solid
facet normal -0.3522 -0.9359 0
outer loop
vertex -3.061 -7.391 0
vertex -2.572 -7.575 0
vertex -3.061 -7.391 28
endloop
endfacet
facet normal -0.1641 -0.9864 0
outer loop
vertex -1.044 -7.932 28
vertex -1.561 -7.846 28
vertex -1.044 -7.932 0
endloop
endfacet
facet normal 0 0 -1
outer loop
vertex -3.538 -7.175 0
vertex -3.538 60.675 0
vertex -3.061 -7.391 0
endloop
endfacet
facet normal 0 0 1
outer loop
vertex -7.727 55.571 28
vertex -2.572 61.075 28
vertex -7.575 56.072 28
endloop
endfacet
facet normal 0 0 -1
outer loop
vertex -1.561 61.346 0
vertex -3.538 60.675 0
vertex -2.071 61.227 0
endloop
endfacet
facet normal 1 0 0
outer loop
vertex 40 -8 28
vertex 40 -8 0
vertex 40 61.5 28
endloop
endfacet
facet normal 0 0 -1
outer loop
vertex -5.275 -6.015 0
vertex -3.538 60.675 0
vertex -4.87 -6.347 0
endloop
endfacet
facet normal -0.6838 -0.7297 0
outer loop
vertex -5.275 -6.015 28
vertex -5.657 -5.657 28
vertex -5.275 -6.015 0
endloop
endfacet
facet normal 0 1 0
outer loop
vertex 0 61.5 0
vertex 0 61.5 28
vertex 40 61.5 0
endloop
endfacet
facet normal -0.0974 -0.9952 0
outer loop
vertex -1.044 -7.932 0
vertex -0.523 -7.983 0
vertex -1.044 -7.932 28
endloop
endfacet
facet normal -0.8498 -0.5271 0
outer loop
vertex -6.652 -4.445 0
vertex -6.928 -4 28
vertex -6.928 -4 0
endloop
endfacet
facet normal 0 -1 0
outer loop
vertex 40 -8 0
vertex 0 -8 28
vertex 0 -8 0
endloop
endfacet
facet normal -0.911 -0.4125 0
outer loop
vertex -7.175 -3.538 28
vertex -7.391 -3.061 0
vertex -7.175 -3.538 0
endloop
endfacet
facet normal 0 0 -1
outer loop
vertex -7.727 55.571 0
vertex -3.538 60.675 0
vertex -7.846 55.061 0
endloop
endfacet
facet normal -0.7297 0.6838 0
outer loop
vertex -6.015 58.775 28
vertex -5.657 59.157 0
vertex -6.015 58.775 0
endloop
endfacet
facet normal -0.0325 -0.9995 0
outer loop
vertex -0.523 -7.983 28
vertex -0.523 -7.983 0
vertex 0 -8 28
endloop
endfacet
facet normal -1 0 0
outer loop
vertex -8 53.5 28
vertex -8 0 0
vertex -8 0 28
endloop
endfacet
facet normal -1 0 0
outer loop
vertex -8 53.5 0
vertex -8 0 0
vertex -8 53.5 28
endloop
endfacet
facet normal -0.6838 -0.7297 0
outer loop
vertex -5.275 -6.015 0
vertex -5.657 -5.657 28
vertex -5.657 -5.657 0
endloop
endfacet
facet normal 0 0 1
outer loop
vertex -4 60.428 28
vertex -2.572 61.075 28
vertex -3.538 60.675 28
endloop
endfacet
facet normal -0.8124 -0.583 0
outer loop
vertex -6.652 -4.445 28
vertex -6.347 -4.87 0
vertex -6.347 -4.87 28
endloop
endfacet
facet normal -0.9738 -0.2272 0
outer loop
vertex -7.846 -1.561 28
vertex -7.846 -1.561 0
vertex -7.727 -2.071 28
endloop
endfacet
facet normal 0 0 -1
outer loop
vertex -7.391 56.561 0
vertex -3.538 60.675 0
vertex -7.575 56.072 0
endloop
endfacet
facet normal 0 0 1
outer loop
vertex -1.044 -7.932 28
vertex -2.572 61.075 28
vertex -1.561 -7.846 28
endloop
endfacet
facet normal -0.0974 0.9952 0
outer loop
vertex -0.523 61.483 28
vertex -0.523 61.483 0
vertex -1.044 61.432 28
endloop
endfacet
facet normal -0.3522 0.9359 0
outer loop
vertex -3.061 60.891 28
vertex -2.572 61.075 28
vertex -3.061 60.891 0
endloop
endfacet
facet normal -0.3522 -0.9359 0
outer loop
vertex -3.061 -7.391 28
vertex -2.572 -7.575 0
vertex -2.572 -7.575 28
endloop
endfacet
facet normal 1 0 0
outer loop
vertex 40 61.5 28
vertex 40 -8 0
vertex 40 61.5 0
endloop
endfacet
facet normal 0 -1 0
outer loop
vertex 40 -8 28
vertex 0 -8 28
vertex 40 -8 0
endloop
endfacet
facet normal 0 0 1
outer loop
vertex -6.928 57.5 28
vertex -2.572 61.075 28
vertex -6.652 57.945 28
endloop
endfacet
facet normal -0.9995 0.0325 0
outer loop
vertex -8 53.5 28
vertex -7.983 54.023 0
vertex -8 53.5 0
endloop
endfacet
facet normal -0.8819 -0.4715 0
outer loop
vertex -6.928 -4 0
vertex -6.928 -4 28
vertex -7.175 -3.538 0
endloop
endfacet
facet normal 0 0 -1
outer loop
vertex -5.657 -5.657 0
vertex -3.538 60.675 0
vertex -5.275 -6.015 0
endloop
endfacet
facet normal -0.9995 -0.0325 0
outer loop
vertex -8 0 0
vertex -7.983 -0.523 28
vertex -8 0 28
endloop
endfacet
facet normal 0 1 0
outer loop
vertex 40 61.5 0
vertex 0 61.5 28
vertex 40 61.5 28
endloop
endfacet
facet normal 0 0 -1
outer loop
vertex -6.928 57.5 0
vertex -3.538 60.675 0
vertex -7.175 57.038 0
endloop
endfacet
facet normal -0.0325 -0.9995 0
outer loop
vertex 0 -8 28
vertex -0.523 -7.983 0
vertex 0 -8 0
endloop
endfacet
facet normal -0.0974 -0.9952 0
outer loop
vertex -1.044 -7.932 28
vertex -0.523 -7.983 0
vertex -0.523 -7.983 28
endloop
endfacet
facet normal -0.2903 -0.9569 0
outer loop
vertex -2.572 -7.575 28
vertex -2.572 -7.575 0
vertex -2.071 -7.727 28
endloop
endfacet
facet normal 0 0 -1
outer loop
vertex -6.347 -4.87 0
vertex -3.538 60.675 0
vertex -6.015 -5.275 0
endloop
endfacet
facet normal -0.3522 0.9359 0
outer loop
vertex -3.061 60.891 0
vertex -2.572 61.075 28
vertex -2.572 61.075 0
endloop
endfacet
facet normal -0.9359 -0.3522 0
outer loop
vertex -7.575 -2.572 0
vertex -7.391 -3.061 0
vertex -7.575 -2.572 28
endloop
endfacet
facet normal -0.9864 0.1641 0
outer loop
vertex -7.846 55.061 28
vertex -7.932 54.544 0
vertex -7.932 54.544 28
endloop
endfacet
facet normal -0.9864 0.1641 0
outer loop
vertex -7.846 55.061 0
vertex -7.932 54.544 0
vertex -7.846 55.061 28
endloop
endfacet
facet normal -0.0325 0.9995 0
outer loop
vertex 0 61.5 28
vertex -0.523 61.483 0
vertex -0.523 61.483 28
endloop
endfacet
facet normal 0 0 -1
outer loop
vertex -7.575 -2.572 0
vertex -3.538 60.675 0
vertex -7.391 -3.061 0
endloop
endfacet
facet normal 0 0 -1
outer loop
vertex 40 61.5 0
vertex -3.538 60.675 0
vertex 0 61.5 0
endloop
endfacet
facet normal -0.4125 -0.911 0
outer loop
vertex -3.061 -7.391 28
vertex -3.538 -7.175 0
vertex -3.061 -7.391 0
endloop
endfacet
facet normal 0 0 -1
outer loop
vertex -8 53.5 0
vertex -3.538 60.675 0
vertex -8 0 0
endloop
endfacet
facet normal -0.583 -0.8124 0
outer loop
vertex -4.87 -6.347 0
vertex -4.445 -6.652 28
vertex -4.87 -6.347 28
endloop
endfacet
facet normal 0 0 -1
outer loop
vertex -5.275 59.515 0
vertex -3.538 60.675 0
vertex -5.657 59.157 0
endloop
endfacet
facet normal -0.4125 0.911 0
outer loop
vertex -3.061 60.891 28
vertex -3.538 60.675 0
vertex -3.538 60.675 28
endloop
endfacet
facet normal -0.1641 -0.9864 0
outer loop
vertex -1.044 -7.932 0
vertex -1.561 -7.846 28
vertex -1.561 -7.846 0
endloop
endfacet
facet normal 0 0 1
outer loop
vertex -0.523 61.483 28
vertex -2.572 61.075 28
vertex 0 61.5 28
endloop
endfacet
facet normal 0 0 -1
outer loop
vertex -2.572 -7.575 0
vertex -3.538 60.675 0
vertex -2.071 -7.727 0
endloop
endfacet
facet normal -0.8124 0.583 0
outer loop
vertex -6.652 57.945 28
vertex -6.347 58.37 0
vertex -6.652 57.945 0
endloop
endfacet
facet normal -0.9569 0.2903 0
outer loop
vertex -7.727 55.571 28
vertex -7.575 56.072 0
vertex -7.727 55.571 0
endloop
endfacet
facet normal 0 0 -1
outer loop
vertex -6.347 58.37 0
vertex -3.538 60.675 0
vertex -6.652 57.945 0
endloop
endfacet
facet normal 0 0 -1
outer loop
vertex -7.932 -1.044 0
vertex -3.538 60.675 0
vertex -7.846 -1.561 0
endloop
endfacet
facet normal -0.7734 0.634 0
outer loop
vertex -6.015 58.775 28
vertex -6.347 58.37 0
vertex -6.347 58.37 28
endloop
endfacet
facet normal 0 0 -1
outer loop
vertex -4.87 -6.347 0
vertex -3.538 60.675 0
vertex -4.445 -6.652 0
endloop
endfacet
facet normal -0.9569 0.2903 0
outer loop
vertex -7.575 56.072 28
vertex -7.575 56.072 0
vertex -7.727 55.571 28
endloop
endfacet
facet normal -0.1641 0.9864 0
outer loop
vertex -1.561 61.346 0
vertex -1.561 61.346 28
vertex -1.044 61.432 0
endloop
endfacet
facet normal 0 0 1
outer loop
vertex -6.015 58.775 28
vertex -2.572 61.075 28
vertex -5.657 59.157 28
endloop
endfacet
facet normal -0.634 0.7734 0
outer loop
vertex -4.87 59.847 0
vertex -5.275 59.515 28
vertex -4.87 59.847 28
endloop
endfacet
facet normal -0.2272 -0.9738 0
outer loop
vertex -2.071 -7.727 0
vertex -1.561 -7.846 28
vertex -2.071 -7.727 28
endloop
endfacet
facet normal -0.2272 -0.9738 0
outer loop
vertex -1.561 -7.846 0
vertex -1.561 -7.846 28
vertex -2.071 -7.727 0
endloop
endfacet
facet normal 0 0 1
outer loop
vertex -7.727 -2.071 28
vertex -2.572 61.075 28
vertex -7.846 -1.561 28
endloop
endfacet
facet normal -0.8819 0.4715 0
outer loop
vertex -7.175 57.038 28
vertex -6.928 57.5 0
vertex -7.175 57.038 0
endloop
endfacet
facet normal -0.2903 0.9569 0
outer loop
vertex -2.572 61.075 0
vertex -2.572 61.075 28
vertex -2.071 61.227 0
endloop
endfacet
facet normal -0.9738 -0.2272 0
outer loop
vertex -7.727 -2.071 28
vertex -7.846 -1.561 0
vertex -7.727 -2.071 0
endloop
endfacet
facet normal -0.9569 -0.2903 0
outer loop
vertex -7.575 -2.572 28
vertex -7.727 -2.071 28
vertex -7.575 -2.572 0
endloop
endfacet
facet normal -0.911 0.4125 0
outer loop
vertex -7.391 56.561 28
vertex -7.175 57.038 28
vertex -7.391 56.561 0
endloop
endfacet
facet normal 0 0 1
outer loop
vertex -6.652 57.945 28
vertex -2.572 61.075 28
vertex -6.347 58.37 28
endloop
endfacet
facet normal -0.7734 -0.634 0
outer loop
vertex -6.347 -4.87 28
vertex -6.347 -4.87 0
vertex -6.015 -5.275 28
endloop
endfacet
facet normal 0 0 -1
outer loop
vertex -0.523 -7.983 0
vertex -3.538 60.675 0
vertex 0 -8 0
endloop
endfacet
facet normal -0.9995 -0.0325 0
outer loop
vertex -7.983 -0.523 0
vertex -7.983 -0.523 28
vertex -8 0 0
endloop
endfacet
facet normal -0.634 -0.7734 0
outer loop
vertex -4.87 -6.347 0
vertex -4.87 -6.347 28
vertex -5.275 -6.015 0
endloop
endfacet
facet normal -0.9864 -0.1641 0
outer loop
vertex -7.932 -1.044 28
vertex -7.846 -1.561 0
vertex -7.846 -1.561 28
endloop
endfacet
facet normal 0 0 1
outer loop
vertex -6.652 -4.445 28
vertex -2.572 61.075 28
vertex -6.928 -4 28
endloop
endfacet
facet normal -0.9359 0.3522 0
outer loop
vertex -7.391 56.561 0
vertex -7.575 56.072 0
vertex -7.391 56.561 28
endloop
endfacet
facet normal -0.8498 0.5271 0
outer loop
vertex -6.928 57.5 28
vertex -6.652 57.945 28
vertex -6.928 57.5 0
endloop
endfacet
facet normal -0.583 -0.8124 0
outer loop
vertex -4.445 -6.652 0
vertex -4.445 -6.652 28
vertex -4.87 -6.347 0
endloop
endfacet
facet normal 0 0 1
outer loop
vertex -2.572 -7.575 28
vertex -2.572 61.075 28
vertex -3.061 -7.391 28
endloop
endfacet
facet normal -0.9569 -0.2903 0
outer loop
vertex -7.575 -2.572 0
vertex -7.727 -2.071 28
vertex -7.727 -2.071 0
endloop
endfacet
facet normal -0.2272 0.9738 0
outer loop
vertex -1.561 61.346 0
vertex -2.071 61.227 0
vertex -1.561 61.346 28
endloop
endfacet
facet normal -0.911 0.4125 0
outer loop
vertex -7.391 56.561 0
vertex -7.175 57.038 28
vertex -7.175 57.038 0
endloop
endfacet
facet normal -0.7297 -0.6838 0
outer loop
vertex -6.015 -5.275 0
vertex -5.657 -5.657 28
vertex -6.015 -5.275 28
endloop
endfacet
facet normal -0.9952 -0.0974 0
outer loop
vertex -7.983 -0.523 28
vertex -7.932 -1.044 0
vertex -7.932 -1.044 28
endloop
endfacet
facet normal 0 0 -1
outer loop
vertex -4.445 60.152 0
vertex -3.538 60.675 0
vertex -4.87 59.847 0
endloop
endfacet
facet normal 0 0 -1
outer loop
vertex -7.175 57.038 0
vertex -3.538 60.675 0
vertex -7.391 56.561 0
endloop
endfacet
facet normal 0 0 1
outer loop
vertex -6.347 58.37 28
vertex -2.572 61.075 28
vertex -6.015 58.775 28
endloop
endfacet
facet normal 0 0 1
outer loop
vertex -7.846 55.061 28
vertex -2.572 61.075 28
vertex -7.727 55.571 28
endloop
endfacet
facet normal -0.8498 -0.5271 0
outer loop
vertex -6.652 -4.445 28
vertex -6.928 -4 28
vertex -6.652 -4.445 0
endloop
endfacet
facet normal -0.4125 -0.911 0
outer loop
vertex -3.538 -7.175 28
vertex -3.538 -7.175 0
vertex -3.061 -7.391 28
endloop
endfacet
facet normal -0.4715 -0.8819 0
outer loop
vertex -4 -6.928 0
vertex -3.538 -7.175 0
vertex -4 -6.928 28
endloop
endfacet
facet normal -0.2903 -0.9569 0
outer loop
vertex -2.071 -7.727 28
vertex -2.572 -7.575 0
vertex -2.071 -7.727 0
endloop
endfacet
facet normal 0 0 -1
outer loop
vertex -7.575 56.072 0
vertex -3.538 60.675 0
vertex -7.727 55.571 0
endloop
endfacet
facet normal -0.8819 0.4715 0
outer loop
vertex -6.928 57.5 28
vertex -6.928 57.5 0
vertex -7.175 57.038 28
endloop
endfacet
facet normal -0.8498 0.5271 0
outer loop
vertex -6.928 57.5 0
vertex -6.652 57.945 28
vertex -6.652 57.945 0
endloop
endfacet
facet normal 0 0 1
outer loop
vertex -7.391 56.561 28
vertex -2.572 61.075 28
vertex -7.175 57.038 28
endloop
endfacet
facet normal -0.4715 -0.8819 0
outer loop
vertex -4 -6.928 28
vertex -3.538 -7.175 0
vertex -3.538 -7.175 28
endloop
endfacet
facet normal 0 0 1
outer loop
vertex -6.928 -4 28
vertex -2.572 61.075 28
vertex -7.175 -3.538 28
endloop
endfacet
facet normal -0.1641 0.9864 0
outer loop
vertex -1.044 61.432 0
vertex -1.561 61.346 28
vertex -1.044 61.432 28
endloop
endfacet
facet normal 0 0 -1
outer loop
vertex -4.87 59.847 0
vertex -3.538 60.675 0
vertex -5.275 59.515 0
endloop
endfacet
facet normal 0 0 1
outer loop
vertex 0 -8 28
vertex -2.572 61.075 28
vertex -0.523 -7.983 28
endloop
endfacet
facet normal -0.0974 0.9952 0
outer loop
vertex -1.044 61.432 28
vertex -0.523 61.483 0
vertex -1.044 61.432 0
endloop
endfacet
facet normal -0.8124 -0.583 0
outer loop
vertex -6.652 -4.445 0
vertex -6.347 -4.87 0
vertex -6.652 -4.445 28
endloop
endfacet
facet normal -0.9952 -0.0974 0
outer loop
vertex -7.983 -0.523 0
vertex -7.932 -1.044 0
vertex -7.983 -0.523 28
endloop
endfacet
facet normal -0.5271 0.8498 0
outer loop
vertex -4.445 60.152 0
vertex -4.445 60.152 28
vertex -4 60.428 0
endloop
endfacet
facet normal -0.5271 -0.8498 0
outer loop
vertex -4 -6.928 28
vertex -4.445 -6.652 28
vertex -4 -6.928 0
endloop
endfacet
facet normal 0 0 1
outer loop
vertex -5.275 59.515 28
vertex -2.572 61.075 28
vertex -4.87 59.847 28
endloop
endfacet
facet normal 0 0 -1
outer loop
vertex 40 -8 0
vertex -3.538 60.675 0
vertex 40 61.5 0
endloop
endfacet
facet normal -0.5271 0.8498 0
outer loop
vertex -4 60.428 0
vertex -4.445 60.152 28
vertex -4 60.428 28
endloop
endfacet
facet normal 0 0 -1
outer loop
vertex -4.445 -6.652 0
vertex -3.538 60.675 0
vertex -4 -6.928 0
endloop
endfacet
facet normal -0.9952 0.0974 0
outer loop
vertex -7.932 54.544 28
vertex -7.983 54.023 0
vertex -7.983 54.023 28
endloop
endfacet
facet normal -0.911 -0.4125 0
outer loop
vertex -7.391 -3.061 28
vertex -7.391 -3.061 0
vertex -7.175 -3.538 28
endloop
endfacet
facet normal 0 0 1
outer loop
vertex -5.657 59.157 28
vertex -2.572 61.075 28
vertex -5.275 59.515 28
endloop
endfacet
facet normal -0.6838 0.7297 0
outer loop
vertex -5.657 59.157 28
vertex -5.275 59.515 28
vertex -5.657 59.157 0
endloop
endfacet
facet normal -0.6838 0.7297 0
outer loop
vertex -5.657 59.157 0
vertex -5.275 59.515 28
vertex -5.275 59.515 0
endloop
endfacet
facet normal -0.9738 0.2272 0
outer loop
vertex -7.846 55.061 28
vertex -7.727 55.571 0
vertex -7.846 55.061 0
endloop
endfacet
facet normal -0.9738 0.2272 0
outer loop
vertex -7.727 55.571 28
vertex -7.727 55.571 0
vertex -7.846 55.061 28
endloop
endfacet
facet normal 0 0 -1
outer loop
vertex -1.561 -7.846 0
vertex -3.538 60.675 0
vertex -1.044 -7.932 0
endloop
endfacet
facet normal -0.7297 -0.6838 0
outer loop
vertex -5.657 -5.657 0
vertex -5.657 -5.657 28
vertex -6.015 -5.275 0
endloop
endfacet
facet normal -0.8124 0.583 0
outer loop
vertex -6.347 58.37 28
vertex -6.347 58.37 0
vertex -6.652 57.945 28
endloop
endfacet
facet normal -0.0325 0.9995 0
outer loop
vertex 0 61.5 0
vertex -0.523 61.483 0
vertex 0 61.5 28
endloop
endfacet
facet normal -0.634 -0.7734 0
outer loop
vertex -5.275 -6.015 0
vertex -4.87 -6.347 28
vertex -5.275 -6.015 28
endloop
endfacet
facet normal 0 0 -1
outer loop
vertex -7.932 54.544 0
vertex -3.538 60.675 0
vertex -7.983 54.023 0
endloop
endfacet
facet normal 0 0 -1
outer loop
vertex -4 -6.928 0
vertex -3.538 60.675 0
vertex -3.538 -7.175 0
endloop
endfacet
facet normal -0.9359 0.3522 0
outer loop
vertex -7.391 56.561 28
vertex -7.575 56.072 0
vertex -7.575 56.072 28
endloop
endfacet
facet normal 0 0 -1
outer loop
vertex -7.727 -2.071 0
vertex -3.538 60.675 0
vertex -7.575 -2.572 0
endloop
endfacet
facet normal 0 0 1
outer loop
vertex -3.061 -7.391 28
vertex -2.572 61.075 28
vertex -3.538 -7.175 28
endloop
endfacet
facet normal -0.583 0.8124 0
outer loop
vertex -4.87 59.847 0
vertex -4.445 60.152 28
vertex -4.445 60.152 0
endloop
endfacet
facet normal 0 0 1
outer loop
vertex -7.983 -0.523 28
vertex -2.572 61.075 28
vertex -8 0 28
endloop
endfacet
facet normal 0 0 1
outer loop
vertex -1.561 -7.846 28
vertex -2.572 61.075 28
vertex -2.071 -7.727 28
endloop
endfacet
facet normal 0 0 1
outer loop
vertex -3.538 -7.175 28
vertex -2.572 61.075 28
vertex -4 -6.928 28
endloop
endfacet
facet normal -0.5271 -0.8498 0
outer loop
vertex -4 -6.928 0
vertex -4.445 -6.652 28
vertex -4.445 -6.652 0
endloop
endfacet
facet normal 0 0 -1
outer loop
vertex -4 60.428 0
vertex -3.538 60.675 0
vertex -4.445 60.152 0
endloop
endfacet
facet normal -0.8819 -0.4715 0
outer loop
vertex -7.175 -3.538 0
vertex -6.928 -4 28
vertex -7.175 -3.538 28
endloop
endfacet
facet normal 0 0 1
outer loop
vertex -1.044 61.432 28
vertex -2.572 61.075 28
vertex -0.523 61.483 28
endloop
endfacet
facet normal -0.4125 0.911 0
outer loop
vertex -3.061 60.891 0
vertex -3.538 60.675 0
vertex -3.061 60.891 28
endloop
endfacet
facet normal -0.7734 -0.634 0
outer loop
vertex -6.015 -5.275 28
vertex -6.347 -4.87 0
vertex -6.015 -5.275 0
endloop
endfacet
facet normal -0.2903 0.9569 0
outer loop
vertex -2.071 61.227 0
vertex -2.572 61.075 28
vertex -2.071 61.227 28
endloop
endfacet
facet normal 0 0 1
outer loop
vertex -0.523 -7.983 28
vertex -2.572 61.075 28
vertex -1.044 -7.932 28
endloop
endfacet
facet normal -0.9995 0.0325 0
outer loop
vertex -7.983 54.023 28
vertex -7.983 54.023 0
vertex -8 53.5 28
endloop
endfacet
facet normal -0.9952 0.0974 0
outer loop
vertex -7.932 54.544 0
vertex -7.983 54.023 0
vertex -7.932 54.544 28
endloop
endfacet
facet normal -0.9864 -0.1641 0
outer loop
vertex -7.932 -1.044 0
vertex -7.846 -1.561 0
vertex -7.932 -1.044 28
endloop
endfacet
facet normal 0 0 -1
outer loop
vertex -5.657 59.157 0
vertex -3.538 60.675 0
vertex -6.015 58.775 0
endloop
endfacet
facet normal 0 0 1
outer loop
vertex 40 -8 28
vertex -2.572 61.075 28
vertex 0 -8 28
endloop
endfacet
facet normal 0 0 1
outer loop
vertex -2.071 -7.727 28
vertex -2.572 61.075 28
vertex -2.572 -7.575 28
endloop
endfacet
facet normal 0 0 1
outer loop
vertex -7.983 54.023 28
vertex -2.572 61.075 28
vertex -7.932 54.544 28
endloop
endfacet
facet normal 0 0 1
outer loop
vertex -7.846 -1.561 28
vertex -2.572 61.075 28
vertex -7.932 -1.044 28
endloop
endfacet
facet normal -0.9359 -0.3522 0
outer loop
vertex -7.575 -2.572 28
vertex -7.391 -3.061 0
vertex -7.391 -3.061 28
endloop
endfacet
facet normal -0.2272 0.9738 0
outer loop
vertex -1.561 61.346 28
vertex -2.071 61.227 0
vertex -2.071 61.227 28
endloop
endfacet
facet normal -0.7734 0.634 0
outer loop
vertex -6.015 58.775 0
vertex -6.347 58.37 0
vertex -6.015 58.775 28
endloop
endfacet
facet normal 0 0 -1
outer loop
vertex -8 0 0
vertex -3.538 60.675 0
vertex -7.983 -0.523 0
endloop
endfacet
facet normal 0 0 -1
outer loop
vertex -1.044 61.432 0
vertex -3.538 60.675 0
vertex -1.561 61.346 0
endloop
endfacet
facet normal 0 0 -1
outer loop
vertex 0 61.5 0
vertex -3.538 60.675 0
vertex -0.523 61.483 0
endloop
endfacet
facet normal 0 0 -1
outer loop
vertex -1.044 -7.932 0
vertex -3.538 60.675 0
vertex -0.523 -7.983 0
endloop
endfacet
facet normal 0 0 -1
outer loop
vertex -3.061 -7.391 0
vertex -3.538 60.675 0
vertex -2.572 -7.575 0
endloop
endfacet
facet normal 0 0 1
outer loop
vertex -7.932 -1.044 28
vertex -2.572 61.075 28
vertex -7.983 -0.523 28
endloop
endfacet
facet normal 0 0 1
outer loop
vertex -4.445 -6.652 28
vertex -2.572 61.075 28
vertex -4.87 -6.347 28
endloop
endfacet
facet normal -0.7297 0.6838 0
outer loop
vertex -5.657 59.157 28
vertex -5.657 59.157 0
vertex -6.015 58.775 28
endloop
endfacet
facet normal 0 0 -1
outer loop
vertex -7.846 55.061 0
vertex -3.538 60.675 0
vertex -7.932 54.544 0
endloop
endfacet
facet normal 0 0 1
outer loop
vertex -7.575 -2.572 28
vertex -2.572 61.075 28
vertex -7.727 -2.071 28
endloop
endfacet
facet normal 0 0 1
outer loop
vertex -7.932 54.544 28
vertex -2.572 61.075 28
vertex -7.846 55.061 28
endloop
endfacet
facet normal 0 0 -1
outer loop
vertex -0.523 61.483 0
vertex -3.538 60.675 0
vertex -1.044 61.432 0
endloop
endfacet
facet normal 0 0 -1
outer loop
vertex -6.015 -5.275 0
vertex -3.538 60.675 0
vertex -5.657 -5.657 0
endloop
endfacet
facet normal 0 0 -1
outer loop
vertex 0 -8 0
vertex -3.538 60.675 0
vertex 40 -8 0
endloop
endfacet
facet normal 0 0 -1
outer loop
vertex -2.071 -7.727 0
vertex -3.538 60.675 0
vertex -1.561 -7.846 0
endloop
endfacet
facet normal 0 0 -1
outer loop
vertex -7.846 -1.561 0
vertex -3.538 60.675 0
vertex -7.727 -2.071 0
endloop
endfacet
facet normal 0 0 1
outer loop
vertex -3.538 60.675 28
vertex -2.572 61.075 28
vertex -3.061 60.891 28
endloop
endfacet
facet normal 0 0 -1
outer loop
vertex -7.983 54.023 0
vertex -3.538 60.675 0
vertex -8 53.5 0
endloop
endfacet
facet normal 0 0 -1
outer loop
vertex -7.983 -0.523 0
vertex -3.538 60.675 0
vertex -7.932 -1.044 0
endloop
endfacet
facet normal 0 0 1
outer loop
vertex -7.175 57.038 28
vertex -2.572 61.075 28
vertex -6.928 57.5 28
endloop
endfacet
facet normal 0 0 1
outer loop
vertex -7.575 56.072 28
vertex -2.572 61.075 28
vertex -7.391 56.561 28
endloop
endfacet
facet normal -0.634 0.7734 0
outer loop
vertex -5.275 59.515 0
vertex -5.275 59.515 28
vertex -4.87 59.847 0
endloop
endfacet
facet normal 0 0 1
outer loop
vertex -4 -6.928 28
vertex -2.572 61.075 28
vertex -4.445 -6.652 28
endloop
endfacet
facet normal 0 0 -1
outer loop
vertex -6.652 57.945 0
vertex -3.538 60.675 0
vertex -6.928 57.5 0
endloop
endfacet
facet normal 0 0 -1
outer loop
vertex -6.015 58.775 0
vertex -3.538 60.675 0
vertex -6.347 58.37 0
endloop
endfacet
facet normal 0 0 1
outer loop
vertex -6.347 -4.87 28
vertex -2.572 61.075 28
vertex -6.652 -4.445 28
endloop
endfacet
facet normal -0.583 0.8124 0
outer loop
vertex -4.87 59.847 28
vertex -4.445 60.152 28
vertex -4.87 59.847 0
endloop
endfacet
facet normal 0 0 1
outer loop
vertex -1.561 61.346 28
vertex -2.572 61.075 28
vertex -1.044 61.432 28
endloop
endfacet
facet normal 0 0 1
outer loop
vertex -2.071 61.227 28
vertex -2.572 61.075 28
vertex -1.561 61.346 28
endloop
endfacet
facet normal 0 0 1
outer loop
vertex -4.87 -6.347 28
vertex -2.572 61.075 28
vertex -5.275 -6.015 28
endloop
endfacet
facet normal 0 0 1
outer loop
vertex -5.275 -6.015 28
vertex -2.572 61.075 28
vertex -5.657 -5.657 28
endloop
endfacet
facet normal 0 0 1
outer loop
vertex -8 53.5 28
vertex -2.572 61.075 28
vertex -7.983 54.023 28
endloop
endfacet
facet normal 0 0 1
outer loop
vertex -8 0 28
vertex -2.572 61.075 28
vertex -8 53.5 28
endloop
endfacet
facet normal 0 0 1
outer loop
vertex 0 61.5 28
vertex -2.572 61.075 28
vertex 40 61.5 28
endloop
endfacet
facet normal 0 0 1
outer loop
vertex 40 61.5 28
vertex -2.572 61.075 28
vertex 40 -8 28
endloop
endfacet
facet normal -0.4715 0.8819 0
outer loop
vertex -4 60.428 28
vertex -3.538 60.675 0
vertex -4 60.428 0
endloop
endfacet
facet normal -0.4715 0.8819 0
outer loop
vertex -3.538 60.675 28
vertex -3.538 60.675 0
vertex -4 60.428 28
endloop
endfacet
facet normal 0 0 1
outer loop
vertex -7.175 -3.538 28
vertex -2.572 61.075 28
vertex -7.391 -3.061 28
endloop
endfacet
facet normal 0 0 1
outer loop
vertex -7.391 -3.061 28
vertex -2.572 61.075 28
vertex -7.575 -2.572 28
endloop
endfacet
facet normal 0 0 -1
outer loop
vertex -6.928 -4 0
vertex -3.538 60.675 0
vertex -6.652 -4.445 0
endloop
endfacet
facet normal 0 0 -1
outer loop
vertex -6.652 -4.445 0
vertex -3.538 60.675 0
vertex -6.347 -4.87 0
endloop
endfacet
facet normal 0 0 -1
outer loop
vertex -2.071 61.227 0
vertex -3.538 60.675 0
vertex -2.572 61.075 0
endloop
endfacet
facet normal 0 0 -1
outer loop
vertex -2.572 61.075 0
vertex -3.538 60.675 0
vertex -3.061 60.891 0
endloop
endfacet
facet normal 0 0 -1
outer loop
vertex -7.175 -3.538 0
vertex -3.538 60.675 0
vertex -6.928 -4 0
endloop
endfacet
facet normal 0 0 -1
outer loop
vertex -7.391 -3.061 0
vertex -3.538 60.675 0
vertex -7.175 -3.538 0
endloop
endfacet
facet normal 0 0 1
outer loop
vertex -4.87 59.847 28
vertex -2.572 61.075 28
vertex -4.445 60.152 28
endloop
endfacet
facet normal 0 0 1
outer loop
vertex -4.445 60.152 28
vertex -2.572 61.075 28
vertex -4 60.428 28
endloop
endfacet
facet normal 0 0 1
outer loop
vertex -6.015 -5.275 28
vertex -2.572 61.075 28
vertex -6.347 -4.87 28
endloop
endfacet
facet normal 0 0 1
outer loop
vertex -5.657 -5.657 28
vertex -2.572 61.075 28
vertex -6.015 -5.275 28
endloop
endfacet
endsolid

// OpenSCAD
r_iv = 8;
minkowski()
{
    cube([48-r_iv,69.5-2*r_iv,28]);
    difference(){
       cylinder(r=r_iv, h=.00001, $fn=r_iv*12);
       translate([0,-r_iv,0])cube([r_iv,2*r_iv,1]);
    }
}
